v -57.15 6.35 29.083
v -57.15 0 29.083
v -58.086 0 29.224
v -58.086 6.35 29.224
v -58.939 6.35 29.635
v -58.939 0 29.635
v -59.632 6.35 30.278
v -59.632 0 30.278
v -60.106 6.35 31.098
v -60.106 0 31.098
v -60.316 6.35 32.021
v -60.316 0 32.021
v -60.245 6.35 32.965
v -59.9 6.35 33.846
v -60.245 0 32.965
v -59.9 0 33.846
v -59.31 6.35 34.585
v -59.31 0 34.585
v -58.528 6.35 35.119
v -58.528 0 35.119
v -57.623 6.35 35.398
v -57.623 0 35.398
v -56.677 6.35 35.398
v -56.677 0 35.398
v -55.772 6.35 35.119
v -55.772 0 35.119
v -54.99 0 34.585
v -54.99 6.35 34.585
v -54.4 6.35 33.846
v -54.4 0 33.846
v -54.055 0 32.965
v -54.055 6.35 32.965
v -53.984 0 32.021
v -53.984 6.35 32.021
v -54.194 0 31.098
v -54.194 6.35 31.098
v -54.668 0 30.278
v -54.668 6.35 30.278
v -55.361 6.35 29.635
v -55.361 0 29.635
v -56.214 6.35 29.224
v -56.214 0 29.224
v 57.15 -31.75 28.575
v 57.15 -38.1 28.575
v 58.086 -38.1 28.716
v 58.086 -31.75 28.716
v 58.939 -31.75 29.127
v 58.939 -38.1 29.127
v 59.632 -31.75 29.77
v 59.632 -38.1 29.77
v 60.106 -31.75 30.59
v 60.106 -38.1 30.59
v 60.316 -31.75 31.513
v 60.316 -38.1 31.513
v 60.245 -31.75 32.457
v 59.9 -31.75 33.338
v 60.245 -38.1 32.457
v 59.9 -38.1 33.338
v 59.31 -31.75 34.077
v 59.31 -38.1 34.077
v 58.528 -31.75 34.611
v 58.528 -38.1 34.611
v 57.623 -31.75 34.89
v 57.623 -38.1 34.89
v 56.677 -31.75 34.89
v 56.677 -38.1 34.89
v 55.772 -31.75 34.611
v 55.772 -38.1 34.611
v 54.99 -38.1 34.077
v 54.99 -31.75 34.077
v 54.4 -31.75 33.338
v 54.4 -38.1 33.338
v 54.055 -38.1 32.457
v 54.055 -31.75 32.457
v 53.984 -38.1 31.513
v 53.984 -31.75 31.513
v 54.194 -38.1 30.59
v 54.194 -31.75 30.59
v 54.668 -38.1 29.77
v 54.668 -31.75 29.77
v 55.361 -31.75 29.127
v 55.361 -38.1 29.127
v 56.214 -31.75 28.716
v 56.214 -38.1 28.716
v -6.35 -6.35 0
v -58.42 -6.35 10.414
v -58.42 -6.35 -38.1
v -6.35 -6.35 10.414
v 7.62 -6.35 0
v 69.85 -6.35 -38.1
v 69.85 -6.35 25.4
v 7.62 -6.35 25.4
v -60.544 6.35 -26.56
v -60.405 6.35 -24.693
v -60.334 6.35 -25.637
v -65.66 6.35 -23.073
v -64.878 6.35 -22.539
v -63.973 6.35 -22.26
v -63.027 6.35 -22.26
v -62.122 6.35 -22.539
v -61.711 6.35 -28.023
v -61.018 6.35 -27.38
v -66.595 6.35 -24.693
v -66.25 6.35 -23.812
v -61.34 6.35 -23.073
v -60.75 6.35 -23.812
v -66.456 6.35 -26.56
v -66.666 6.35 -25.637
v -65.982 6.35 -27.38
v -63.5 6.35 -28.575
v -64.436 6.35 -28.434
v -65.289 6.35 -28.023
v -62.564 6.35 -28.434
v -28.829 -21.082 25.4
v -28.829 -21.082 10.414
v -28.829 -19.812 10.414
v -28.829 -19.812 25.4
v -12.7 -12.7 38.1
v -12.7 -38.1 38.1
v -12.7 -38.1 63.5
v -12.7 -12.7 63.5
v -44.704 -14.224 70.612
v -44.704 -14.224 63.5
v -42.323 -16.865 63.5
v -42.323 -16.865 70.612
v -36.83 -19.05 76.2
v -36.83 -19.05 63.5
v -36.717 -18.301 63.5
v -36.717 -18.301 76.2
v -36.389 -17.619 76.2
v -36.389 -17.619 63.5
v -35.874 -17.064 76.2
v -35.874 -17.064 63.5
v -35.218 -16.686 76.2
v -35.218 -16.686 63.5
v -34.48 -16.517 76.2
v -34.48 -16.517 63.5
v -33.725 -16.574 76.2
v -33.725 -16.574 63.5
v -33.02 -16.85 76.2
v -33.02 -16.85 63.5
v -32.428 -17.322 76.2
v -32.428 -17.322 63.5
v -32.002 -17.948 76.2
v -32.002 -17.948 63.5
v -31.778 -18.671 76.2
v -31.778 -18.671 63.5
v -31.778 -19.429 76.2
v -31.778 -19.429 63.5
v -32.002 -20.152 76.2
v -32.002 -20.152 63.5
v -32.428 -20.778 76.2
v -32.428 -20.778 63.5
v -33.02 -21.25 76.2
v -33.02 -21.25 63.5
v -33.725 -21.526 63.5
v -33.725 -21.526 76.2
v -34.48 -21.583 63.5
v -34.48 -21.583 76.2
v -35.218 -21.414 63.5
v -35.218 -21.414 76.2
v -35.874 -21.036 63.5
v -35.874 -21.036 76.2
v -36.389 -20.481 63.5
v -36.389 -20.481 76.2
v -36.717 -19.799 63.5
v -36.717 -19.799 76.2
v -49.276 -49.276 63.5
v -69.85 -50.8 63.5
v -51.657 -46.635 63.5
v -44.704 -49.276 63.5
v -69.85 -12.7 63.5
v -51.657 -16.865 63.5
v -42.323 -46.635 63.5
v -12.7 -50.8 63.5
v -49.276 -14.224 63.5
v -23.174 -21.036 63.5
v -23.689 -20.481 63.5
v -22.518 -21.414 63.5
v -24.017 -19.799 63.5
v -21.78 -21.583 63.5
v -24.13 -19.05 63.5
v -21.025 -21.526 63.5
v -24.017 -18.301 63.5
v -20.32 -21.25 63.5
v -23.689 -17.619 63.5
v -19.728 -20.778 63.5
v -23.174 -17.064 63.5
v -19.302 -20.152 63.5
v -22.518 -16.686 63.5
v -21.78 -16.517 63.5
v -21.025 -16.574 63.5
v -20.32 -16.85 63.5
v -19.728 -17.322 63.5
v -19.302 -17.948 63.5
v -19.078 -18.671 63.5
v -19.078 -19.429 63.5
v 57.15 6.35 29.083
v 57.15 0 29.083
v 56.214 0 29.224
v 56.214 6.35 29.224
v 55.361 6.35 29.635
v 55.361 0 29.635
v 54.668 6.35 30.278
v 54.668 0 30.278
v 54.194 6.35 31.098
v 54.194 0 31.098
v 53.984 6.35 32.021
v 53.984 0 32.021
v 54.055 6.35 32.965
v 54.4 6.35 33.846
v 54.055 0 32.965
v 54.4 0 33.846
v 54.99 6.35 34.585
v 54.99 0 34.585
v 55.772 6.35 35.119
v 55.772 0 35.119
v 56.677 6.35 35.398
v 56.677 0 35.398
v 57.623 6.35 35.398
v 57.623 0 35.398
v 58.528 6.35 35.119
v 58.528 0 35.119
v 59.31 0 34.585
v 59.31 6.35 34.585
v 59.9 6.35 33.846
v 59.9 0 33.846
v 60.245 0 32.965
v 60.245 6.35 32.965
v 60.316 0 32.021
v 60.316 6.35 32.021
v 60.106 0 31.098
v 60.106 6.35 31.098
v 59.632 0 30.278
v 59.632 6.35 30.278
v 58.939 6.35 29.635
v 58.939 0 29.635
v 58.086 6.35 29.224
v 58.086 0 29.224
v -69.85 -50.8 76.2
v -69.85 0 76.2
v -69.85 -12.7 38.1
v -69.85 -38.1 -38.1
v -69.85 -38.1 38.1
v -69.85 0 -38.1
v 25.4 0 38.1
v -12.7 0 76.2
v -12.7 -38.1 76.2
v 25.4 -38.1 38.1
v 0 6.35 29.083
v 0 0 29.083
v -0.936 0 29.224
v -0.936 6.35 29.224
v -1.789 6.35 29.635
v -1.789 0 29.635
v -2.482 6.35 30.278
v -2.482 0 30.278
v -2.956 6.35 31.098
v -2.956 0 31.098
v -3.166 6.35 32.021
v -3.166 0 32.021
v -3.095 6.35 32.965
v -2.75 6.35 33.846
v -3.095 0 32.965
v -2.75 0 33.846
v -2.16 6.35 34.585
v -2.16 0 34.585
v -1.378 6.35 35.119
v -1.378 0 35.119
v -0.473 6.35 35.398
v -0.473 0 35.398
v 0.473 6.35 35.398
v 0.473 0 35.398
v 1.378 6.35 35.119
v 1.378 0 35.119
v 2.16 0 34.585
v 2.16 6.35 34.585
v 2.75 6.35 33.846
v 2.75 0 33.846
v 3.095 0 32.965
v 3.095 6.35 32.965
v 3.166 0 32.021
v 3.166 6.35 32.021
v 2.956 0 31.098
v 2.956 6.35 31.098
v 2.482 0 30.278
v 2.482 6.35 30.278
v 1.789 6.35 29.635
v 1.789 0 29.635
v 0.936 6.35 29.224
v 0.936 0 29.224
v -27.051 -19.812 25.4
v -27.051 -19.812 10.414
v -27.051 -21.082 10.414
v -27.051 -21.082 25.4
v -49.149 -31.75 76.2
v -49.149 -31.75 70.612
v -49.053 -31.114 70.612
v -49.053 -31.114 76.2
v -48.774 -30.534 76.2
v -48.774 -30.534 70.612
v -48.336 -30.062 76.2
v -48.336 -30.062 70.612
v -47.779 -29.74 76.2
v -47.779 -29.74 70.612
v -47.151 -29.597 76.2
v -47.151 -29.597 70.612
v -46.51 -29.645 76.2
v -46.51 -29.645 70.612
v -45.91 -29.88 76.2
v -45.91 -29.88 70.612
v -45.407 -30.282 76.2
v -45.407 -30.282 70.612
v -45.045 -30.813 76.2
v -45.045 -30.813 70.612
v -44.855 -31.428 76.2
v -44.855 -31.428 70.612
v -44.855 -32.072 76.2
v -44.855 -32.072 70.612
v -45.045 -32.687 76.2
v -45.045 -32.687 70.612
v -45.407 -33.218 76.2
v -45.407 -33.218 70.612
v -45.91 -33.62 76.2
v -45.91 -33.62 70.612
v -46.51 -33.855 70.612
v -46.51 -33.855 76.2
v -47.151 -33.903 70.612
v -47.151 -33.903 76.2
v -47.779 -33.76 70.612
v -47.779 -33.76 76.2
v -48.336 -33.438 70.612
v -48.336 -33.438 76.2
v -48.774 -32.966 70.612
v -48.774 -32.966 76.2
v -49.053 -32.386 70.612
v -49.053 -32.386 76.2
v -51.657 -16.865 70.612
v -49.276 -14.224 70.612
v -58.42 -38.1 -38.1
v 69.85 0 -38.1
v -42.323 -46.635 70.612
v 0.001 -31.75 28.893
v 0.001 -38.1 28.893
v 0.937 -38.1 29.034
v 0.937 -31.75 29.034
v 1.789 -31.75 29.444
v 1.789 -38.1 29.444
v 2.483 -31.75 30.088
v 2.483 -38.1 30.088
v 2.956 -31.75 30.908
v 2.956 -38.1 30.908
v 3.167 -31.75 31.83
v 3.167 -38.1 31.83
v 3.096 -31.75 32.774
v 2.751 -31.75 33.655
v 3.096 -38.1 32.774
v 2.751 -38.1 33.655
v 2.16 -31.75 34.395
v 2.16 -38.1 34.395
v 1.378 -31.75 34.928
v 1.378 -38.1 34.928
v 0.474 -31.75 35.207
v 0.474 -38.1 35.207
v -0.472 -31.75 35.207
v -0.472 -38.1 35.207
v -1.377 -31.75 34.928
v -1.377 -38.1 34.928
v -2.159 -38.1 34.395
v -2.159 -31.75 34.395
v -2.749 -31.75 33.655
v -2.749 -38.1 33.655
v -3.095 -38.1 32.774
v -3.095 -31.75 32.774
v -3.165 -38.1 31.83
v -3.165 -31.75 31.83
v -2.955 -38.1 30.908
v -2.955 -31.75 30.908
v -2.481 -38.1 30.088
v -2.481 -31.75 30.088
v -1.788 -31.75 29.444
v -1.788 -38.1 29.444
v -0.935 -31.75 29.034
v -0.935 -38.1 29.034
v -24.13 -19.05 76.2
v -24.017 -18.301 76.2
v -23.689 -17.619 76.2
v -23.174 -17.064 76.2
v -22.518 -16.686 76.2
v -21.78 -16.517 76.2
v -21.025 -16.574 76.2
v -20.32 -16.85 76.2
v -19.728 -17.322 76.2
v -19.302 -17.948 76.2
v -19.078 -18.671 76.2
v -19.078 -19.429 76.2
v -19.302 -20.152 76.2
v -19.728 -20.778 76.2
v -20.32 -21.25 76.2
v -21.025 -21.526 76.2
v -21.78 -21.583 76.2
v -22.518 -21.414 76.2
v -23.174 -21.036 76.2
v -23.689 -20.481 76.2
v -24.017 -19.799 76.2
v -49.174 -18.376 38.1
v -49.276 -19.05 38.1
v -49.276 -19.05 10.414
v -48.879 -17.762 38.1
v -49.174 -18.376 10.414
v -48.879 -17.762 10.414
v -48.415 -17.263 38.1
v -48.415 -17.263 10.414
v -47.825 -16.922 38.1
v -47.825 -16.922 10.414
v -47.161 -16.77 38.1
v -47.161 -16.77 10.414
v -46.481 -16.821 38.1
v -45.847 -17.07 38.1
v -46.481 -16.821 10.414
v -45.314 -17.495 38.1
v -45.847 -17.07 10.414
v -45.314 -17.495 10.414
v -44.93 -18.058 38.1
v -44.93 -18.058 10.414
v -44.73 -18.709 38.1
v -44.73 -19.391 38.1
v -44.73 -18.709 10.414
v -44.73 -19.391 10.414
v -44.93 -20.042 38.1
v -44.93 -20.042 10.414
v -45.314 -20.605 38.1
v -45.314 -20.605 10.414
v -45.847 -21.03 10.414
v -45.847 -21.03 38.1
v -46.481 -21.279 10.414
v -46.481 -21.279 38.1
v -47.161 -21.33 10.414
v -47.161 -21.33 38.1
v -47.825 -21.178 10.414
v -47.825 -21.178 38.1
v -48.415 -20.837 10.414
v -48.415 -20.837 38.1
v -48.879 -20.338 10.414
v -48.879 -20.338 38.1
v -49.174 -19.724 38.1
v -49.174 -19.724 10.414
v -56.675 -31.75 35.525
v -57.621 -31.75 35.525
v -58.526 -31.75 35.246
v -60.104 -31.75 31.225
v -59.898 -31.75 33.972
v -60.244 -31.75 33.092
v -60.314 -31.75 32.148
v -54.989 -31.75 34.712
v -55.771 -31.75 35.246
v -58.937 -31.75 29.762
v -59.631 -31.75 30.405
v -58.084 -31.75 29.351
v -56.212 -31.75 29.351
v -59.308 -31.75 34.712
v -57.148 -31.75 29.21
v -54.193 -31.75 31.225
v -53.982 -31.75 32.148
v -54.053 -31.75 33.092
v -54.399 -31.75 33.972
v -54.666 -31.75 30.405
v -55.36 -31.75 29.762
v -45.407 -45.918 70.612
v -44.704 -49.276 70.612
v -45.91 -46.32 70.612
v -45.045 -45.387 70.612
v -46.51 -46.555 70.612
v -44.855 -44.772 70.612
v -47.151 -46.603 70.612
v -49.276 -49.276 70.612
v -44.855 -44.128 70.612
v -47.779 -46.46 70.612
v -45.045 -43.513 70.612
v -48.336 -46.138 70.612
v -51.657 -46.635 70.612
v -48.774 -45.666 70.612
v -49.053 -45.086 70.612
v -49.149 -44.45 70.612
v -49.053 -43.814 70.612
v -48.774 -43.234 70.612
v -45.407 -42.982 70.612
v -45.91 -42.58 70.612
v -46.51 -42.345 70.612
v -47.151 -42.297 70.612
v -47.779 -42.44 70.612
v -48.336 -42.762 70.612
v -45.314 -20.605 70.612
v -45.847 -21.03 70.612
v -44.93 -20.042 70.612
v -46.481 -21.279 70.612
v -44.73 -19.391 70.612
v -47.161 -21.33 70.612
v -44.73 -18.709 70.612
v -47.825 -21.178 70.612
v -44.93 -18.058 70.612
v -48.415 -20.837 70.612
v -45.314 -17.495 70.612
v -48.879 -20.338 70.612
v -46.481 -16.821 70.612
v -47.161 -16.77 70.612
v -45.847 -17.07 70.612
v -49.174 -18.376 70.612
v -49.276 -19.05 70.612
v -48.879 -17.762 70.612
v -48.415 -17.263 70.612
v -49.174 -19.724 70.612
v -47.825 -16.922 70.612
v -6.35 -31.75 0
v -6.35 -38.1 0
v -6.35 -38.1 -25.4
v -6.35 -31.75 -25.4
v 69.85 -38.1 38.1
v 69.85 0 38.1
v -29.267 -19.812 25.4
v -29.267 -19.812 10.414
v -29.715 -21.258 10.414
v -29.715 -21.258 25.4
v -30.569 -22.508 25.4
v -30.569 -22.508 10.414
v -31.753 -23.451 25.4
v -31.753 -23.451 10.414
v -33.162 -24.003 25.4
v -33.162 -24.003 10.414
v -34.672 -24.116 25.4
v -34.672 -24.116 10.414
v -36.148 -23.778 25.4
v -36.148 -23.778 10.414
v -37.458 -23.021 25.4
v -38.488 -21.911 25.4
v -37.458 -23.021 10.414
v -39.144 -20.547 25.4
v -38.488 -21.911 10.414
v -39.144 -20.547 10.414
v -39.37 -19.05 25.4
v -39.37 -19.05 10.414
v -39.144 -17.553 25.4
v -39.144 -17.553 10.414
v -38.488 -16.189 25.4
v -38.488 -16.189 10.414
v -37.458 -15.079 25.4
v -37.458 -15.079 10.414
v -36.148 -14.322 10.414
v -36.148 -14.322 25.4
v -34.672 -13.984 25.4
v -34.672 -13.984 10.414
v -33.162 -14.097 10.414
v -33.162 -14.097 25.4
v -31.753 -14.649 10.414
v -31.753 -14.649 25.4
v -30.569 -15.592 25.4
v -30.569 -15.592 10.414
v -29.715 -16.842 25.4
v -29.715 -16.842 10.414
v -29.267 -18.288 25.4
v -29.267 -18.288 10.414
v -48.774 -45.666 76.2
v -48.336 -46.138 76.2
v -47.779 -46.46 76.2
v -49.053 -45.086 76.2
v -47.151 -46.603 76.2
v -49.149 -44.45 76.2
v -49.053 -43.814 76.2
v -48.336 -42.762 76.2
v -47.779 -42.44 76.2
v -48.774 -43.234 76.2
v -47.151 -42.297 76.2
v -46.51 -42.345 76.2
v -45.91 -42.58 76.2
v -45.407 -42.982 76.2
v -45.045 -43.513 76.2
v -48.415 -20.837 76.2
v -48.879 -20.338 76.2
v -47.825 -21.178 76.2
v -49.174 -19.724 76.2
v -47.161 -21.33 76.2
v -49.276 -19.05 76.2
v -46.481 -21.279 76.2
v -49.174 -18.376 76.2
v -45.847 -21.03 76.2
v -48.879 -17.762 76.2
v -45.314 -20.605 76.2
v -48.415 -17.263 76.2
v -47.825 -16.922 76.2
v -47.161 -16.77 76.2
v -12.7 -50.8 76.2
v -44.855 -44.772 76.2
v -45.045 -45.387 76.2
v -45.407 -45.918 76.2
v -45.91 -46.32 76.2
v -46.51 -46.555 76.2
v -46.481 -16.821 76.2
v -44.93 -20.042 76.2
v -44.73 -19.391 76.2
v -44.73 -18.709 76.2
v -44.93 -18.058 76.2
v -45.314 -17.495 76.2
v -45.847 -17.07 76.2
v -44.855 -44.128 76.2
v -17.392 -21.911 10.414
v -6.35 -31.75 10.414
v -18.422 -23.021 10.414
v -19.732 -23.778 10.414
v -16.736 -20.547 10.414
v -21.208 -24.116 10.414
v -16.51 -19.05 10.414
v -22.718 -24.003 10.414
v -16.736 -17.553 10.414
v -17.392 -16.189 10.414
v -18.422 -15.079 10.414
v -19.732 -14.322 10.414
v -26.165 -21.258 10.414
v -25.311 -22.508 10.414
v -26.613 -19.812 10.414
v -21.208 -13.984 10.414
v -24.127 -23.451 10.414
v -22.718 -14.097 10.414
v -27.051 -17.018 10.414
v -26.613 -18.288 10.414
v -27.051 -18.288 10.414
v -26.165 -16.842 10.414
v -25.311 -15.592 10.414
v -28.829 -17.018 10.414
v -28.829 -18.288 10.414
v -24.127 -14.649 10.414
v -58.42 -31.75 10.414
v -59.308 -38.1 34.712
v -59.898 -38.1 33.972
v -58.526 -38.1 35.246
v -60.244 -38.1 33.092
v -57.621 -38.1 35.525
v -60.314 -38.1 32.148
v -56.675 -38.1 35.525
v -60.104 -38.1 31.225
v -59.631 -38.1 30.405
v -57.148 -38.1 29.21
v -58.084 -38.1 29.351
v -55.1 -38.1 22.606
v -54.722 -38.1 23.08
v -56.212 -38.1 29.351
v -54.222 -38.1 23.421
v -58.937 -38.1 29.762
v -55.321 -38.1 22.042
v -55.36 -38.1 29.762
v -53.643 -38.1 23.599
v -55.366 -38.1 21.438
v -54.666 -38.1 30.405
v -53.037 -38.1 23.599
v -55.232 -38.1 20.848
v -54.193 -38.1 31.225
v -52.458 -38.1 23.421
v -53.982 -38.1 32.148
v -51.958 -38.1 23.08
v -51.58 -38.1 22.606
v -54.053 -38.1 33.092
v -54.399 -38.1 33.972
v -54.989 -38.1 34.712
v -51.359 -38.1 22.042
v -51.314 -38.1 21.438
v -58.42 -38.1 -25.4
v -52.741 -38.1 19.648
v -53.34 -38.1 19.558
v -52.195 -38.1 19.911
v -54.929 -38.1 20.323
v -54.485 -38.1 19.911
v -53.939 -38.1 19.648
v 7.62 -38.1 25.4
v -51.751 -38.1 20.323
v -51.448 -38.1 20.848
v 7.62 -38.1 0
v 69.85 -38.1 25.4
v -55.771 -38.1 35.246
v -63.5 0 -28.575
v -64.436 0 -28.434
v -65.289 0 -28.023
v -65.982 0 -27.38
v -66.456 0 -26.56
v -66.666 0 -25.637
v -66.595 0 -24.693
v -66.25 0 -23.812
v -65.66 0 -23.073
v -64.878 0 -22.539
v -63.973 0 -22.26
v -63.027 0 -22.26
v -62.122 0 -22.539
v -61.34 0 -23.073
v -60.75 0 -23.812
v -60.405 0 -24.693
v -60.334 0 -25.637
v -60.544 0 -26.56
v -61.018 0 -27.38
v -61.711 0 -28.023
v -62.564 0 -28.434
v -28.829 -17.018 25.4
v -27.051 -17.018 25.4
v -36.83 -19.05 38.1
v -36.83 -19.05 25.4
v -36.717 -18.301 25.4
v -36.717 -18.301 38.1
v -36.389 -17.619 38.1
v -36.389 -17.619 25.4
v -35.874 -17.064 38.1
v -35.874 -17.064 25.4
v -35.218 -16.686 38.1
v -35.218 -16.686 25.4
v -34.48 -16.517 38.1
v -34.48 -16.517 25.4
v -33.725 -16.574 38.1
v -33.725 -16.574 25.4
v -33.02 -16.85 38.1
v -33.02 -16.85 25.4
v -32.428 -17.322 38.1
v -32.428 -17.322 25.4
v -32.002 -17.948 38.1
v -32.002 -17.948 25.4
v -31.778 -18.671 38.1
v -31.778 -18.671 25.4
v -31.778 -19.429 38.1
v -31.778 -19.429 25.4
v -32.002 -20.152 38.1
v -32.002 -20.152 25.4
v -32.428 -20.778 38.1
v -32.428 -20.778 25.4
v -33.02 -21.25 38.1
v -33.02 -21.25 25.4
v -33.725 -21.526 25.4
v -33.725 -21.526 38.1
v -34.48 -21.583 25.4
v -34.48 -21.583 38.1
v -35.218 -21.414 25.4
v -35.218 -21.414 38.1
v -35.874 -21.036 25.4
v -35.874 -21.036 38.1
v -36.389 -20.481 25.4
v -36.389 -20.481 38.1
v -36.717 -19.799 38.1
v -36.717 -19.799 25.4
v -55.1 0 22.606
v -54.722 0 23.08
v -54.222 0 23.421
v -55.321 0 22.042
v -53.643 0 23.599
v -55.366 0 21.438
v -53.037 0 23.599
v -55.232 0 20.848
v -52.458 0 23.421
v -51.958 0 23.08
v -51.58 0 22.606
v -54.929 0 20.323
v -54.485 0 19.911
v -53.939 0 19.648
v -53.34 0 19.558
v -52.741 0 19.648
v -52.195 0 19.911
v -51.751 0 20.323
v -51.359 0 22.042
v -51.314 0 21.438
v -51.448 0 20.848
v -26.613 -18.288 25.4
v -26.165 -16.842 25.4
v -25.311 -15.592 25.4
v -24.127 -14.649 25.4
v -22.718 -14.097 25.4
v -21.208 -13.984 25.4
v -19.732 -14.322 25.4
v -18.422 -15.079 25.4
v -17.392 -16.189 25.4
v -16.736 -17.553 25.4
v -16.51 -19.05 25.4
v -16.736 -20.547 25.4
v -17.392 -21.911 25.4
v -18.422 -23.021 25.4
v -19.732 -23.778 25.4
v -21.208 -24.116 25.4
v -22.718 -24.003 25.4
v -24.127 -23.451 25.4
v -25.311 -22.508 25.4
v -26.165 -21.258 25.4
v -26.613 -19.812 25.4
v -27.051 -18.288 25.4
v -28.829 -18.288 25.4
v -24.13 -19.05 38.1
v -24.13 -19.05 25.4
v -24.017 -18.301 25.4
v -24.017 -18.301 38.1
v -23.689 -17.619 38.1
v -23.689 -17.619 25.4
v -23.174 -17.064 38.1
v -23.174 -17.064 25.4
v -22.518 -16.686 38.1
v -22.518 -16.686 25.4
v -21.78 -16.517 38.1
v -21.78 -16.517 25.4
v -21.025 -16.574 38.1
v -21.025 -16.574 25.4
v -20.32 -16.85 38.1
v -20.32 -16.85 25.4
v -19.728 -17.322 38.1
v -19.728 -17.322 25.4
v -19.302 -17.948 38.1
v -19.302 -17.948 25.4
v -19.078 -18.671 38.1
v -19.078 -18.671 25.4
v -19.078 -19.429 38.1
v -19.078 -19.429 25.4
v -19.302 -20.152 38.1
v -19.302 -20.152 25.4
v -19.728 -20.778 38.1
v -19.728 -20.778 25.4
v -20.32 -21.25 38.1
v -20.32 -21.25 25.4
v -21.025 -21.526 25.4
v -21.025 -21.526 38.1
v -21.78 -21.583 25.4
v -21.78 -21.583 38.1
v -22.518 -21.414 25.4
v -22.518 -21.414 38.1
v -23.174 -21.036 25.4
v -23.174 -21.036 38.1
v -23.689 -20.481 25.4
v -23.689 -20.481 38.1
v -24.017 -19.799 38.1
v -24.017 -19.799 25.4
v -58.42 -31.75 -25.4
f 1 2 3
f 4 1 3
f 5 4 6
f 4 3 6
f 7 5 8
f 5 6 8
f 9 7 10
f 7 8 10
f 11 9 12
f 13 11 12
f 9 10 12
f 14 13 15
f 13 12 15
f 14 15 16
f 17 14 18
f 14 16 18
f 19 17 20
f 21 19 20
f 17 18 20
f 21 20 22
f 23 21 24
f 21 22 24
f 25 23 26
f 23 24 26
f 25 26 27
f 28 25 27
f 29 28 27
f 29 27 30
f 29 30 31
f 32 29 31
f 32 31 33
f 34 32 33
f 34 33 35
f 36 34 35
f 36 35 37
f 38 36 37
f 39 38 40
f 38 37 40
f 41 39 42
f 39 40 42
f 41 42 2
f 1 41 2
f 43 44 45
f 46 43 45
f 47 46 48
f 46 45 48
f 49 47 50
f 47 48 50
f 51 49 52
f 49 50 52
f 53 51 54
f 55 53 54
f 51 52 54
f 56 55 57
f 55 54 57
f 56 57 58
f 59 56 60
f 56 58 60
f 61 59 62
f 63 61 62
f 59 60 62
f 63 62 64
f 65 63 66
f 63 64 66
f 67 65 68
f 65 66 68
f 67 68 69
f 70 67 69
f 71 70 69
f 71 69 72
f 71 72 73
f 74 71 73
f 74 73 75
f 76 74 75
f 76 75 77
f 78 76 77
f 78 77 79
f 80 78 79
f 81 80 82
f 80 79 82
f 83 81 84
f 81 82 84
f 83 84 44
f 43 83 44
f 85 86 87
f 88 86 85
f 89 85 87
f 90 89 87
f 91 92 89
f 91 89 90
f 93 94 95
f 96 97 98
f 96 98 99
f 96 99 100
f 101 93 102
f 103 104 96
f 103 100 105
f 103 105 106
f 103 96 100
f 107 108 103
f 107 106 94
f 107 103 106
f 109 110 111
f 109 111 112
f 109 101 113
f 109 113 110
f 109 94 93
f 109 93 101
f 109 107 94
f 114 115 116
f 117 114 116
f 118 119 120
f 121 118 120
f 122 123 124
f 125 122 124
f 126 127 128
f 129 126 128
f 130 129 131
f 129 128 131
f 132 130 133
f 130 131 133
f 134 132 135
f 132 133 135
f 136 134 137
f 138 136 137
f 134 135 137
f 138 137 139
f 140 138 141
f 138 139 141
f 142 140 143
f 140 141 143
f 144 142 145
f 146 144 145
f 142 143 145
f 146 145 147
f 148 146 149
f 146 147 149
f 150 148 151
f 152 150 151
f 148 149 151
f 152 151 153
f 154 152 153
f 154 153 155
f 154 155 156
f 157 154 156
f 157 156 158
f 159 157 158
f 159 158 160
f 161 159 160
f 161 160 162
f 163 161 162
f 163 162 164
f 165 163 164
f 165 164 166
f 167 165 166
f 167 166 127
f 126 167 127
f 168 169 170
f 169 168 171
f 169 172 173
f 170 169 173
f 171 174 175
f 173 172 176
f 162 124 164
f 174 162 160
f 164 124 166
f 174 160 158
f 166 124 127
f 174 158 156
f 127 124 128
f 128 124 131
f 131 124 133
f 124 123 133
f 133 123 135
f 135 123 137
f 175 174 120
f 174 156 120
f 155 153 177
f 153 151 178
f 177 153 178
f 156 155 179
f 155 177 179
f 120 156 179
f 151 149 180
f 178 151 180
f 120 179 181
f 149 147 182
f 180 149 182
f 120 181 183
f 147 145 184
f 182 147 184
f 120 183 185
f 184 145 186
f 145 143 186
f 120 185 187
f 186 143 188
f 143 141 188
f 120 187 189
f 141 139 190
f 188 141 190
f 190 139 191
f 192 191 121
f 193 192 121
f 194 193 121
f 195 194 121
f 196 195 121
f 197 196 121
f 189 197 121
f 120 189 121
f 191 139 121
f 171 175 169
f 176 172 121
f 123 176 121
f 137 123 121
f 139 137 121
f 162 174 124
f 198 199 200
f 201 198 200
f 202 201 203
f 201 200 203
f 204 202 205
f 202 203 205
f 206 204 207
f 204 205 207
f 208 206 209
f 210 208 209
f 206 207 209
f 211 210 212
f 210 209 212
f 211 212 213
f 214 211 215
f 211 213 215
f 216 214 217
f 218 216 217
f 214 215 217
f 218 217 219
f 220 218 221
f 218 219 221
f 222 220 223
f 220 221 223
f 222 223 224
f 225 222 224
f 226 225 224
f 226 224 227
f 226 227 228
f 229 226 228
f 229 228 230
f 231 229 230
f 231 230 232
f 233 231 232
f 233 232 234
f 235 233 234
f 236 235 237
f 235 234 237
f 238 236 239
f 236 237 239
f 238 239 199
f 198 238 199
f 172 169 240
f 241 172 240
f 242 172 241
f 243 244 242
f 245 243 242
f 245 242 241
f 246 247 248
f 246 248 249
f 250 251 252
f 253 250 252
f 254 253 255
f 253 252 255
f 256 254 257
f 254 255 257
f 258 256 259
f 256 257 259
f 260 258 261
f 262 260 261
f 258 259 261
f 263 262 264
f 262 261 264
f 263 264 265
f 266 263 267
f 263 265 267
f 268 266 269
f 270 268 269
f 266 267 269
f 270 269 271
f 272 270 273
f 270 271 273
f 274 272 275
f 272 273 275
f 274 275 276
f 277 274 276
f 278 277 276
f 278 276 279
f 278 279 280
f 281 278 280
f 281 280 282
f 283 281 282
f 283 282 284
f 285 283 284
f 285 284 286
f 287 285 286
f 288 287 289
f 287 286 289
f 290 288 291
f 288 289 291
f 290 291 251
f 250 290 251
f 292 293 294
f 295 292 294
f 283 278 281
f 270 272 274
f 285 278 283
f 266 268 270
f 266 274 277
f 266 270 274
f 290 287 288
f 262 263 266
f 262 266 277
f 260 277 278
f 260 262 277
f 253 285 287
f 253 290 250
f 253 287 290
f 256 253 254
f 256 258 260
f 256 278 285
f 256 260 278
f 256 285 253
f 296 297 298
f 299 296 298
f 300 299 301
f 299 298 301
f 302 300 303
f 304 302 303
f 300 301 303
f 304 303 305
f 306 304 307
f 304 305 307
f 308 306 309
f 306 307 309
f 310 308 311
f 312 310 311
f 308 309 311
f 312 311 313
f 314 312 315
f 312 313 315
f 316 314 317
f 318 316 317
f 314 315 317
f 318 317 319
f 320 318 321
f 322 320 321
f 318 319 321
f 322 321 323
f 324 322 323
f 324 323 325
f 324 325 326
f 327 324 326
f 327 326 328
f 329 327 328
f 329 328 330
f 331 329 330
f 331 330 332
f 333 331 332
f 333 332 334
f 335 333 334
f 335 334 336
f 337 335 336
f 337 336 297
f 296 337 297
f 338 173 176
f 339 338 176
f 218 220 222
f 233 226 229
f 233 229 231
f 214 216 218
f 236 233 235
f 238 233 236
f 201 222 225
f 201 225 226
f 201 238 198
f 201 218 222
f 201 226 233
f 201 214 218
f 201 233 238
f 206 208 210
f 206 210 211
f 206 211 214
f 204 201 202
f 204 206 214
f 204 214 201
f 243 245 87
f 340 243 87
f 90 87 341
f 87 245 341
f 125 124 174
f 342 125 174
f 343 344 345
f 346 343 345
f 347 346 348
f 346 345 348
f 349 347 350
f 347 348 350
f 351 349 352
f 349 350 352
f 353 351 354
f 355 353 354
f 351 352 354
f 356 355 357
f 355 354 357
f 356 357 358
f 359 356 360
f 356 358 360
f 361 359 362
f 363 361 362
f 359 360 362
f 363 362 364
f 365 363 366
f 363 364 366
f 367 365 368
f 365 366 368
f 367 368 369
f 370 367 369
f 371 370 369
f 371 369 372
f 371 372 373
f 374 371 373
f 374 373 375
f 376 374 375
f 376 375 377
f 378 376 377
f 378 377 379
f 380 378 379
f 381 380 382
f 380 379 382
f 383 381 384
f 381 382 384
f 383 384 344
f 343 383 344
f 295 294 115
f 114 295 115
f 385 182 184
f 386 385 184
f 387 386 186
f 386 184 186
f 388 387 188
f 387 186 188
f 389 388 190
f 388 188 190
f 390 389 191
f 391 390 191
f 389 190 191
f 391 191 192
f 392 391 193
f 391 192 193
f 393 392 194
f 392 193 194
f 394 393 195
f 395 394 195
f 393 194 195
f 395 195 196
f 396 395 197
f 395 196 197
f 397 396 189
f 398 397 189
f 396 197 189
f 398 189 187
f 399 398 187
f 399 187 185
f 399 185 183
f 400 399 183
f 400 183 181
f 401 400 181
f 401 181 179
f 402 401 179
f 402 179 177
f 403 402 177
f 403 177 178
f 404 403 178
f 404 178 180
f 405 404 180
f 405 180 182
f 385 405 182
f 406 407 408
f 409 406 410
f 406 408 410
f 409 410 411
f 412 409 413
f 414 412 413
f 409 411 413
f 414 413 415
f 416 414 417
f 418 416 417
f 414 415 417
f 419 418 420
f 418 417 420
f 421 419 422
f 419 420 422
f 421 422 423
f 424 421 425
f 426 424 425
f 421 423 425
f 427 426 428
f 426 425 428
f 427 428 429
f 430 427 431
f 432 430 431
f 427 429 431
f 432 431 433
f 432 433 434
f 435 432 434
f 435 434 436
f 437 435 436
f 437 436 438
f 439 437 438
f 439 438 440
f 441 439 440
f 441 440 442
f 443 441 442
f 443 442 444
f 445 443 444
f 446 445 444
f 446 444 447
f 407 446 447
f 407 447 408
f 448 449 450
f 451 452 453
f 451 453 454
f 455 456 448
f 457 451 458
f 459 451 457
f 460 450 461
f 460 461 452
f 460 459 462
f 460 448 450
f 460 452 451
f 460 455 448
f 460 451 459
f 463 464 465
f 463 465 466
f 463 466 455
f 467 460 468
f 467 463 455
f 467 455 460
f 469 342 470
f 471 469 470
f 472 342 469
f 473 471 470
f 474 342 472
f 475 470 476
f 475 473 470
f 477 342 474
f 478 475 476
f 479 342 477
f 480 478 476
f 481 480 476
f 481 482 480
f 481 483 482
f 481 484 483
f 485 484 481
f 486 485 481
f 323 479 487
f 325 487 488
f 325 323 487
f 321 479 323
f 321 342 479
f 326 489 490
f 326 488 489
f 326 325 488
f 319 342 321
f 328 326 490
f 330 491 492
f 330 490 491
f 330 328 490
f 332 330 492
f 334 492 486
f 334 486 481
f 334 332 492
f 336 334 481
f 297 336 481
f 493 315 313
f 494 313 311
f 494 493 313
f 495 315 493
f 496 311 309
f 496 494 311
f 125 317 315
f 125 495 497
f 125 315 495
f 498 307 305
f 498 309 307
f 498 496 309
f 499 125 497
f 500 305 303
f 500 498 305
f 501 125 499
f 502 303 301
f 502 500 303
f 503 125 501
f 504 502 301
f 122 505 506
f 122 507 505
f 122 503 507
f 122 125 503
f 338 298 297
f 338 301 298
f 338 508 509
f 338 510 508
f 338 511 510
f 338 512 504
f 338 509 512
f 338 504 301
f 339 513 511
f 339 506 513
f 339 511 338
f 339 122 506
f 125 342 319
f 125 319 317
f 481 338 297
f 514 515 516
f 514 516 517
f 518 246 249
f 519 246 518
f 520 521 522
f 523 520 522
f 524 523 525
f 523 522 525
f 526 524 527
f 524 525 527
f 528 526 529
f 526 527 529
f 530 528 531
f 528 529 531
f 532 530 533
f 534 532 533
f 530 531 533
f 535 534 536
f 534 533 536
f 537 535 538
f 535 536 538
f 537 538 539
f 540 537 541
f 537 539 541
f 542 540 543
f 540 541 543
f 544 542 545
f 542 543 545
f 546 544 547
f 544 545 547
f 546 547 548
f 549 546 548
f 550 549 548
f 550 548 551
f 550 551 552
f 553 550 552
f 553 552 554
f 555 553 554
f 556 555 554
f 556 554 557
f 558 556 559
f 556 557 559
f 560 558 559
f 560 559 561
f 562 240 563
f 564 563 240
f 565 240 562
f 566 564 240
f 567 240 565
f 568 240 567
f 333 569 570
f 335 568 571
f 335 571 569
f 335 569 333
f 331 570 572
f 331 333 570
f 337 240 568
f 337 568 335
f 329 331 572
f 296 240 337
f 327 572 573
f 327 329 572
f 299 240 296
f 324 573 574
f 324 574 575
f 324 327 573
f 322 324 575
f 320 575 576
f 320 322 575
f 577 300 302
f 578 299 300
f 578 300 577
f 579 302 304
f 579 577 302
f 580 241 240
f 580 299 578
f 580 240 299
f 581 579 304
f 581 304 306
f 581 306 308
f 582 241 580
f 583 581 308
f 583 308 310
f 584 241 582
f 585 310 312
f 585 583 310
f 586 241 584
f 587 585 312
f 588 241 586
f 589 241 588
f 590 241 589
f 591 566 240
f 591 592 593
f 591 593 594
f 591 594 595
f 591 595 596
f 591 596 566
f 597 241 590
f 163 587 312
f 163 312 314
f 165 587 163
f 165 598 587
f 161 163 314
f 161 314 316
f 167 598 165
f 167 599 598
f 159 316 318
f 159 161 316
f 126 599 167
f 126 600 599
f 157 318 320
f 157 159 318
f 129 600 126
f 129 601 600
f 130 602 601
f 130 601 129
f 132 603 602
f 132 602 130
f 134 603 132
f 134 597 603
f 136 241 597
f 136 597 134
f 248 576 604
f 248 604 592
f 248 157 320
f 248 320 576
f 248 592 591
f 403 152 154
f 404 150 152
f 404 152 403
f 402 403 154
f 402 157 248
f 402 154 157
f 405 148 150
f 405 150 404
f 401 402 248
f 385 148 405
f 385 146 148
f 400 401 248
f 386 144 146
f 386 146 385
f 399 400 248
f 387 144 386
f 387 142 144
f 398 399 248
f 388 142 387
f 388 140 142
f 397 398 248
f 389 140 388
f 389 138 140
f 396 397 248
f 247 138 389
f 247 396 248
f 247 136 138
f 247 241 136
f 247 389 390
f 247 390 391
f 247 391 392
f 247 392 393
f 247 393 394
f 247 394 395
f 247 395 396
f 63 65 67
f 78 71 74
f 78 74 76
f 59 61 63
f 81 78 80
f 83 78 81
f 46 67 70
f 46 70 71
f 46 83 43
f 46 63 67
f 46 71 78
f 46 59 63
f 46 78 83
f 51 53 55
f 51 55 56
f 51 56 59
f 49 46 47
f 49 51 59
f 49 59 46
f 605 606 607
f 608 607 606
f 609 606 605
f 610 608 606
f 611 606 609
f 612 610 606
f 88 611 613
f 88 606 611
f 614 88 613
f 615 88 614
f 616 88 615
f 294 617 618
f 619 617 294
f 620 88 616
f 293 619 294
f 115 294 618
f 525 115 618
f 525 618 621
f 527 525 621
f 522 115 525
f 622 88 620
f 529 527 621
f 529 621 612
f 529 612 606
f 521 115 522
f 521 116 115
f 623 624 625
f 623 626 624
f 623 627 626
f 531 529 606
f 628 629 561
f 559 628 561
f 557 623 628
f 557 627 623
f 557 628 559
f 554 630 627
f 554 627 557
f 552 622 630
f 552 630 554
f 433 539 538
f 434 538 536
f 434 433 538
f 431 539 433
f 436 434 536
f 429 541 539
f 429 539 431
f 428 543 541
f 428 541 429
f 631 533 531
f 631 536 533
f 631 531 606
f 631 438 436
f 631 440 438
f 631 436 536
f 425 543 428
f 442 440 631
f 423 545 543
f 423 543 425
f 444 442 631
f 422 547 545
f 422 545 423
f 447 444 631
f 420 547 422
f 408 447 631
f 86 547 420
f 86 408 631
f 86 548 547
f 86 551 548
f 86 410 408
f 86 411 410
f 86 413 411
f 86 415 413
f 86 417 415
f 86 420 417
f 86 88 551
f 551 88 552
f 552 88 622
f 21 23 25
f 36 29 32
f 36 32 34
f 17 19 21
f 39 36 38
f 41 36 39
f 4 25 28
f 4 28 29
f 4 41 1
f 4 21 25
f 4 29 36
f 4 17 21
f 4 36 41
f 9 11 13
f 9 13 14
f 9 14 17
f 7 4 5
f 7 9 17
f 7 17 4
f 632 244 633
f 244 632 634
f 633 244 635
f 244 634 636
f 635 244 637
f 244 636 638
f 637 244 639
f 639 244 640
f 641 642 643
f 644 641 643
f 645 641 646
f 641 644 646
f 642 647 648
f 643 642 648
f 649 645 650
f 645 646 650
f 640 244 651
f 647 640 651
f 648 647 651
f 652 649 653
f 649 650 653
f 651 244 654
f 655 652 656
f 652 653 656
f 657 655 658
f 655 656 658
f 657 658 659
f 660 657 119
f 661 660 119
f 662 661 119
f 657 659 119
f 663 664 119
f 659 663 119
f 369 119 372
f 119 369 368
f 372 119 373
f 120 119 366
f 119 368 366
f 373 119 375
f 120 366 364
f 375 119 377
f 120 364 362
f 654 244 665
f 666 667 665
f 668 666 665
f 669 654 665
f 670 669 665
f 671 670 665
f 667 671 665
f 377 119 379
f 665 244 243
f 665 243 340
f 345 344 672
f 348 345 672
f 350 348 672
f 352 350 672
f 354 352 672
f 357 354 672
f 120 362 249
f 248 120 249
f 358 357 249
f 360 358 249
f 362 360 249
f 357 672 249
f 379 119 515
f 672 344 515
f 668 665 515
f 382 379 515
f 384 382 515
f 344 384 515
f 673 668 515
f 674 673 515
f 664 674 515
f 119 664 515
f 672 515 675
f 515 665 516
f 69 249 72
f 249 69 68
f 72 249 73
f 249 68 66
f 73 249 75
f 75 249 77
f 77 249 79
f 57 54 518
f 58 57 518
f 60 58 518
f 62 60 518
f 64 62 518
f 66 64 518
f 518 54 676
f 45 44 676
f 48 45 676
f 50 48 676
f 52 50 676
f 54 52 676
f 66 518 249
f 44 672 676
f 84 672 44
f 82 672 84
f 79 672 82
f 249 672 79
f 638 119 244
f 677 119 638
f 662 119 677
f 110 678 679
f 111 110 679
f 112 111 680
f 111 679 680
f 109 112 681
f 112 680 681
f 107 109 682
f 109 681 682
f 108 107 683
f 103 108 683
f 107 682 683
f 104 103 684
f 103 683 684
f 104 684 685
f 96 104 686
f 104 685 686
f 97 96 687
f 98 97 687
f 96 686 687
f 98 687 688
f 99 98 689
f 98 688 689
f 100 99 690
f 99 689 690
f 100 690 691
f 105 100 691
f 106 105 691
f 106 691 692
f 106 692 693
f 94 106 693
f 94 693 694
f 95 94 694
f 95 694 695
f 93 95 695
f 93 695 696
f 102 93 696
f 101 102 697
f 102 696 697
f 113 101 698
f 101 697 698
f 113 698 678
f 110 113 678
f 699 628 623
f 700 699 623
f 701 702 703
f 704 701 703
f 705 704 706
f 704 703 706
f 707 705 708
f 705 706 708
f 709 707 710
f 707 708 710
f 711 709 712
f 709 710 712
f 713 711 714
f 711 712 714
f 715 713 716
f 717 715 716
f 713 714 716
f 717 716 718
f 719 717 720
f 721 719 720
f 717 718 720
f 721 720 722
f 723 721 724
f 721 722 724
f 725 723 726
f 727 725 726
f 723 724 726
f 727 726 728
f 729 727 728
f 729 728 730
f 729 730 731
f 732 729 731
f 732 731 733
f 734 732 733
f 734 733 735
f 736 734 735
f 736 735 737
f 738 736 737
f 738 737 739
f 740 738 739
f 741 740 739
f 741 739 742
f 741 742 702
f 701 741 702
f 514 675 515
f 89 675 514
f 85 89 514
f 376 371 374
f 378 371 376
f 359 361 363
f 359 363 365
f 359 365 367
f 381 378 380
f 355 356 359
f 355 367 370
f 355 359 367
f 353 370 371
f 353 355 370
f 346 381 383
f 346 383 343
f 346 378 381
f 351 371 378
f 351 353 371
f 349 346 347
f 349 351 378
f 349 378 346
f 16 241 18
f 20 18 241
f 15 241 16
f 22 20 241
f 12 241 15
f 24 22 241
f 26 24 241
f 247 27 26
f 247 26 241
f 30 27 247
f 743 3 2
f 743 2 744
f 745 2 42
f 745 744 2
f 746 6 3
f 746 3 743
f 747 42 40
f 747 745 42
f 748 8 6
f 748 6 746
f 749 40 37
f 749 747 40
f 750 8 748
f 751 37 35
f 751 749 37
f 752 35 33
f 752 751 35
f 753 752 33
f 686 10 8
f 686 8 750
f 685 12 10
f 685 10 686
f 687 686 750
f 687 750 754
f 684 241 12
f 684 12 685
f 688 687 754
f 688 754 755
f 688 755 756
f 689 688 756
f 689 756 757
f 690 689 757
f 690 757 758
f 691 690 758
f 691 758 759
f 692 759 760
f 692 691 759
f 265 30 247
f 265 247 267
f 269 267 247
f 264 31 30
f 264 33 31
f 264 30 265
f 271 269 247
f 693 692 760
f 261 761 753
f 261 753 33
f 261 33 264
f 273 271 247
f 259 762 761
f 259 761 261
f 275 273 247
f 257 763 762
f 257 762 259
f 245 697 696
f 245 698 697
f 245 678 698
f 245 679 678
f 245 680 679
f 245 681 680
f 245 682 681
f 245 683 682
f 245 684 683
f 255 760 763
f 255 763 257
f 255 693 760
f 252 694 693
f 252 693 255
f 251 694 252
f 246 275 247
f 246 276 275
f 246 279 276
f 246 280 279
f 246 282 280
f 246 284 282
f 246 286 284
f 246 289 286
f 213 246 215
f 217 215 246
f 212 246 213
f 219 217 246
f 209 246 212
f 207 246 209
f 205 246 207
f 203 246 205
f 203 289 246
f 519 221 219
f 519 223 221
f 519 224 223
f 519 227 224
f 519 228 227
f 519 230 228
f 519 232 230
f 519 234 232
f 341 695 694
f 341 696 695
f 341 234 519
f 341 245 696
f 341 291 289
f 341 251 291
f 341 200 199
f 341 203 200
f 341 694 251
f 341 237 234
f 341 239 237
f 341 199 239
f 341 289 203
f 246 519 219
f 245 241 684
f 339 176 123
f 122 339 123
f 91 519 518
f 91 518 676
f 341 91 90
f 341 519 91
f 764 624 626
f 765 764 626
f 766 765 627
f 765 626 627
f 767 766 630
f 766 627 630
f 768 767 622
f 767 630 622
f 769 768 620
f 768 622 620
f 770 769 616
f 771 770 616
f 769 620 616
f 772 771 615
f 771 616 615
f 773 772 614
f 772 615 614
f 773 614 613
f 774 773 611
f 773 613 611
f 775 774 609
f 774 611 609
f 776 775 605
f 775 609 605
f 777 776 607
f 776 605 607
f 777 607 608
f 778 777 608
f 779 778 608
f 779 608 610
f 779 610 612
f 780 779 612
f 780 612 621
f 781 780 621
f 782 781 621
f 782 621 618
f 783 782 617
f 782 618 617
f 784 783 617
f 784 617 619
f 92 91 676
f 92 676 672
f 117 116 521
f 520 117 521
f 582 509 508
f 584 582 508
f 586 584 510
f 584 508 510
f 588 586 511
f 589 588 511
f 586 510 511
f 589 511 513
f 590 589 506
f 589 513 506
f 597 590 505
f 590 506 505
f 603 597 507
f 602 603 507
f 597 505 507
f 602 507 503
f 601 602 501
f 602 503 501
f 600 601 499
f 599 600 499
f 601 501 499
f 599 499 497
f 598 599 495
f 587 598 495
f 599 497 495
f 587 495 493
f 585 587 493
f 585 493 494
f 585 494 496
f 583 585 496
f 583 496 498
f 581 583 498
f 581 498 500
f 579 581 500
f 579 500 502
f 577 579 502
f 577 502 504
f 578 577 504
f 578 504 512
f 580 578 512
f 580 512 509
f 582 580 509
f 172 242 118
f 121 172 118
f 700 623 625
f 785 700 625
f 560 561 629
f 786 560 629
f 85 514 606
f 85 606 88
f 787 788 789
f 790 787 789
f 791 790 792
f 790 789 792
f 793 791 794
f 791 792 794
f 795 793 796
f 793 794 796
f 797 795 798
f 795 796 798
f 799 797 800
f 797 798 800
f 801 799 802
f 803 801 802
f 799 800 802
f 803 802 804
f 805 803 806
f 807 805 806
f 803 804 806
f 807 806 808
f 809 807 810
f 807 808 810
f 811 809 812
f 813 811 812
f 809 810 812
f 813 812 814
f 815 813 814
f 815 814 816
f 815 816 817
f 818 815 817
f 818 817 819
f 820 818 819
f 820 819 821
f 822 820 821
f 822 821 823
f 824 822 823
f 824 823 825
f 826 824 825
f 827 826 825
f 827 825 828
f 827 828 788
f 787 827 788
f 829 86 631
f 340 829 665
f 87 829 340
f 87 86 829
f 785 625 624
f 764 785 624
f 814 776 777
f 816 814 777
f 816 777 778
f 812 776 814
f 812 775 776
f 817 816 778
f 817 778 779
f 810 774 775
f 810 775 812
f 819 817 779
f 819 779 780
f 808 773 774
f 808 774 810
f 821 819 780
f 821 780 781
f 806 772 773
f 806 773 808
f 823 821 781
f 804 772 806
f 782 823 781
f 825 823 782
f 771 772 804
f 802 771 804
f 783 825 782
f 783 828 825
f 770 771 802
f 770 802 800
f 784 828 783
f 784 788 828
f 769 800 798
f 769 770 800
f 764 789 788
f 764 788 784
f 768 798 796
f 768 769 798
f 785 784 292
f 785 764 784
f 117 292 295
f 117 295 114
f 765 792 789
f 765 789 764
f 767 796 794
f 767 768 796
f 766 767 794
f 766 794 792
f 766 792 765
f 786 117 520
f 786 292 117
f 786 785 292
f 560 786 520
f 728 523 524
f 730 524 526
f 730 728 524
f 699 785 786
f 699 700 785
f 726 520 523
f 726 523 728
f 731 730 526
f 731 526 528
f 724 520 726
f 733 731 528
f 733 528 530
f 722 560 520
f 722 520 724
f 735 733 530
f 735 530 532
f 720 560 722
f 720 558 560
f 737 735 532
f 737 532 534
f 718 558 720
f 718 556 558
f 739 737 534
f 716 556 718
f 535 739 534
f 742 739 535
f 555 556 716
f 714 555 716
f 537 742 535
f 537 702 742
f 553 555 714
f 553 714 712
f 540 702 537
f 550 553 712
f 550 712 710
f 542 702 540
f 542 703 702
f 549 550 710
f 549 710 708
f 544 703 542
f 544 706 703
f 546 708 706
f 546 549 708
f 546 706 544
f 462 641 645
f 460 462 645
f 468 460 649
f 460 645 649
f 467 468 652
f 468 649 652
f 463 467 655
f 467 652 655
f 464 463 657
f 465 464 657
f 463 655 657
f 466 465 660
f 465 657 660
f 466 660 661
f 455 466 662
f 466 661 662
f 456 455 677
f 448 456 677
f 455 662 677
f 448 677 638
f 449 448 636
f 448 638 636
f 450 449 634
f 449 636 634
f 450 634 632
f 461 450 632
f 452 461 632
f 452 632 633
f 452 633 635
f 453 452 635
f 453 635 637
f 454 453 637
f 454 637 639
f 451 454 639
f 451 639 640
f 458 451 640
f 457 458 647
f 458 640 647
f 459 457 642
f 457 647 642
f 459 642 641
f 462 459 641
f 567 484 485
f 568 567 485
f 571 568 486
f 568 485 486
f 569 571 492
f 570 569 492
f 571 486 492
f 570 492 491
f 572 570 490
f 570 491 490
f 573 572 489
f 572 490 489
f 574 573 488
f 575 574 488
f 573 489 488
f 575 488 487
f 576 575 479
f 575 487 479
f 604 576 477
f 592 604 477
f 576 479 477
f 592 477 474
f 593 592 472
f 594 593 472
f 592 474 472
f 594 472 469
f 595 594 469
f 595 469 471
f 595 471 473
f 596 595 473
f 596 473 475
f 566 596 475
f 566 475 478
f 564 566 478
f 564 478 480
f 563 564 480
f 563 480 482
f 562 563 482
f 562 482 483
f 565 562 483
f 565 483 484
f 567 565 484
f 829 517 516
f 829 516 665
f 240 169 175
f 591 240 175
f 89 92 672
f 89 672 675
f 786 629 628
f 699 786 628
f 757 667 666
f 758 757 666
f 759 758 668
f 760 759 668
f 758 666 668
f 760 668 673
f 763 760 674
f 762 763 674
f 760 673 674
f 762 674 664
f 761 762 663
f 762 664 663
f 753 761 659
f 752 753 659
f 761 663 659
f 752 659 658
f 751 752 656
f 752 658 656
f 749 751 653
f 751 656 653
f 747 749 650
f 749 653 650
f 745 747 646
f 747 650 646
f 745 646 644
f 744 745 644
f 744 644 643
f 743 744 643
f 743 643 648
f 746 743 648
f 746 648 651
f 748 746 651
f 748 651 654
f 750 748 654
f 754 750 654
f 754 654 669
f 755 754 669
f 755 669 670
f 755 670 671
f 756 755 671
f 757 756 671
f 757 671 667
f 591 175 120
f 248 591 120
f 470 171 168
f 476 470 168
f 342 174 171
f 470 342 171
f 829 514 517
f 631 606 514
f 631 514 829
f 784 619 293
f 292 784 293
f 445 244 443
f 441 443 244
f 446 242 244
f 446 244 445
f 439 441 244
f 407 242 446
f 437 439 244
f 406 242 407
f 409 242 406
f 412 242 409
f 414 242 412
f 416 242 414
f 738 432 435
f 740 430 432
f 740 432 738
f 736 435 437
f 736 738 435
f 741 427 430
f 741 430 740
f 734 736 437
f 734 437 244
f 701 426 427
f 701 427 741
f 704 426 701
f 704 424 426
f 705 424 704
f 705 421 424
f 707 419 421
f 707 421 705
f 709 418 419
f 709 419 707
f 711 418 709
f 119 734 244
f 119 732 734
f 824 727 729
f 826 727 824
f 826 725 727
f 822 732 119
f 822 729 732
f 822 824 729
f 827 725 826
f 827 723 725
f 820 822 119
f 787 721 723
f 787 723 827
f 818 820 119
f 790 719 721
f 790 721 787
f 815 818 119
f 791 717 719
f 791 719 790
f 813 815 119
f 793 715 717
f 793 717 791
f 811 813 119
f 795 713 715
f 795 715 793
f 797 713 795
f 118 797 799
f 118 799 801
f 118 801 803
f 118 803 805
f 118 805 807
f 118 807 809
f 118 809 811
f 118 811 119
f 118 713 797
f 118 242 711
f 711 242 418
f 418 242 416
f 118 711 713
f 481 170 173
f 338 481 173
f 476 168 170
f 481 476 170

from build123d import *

# Parameters (mm, degrees)
SKETCH1_W               = 139.7
SKETCH1_H               = 76.2
BOSS_EXTRUDE1_DEPTH     = 38.1
CUT_EXTRUDE1_DEPTH      = 89.217019333
CUT_EXTRUDE1_DEPTH_BACK = 31.75
SKETCH3_R               = 2.032
CUT_EXTRUDE2_DEPTH      = 89.217019333
SKETCH4_W               = 52.07
SKETCH4_H               = 25.4
CUT_EXTRUDE3_DEPTH      = 10.414
SKETCH7_W               = 57.15
SKETCH7_H               = 12.7
BOSS_EXTRUDE2_DEPTH     = 25.4
SKETCH8_W               = 57.15
SKETCH8_H               = 50.8
BOSS_EXTRUDE3_DEPTH     = 12.7
SKETCH5_R               = 2.286
SKETCH5_R_2             = 2.54
CUT_EXTRUDE4_DEPTH      = 109.570070904
CUT_EXTRUDE5_DEPTH      = 14.986
CUT_EXTRUDE6_DEPTH      = 7.112
SKETCH10_R              = 2.159
CUT_EXTRUDE7_DEPTH      = 139.84509874
SKETCH11_W              = 52.07
SKETCH11_H              = 6.35
BOSS_EXTRUDE4_DEPTH     = 25.4
BOSS_EXTRUDE5_DEPTH     = 38.1
SKETCH15_R              = 3.175
CUT_EXTRUDE8_DEPTH      = 6.35
SKETCH16_R              = 3.175
BOSS_EXTRUDE6_DEPTH     = 6.35


with BuildPart() as part:
    # Sketch1 → Boss-Extrude1 (new body)
    with BuildSketch(Plane(origin=(0, 0, 0), x_dir=(1, 0, 0), z_dir=(0, 1, 0))):
        Rectangle(SKETCH1_W, SKETCH1_H)
    extrude(amount=-BOSS_EXTRUDE1_DEPTH)

    # Sketch2 → Cut-Extrude1 (cut, two sides: drawn at the far end of the back side and taken through both)
    with BuildSketch(Plane.XZ.offset(38.1).offset(-CUT_EXTRUDE1_DEPTH_BACK)):
        Polygon((386.759367729, 25.4), (69.85, 25.4), (7.62, 25.4), (7.62, 0), (-58.42, 0), (-58.42, -38.1), (-58.42, -355.009367729), (353.331408797, -836.86719611), (798.510776526, -456.457828381), align=None)
    extrude(amount=CUT_EXTRUDE1_DEPTH + CUT_EXTRUDE1_DEPTH_BACK, mode=Mode.SUBTRACT)

    # Sketch3 → Cut-Extrude2 (cut, through all)
    with BuildSketch(Plane.XZ.offset(38.1)):
        with Locations(Location((-53.34, 21.59, 0), (0, 0, 270))):
            Circle(SKETCH3_R)
    extrude(amount=-CUT_EXTRUDE2_DEPTH, mode=Mode.SUBTRACT)

    # Sketch4 → Cut-Extrude3 (cut)
    with BuildSketch(Plane(origin=(0, 0, 0), x_dir=(-1, 0, 0), z_dir=(0, 0, -1))):
        with Locations((32.385, -19.05)):
            Rectangle(SKETCH4_W, SKETCH4_H)
    extrude(amount=-CUT_EXTRUDE3_DEPTH, mode=Mode.SUBTRACT)

    # Sketch7 → Boss-Extrude2 (add)
    with BuildSketch(Plane.XY.offset(38.1)):
        with Locations((-41.275, -6.35)):
            Rectangle(SKETCH7_W, SKETCH7_H)
    extrude(amount=BOSS_EXTRUDE2_DEPTH)

    # Sketch8 → Boss-Extrude3 (add)
    with BuildSketch(Plane.XY.offset(63.5)):
        with Locations((-41.275, -25.4)):
            Rectangle(SKETCH8_W, SKETCH8_H)
    extrude(amount=BOSS_EXTRUDE3_DEPTH)

    # Sketch5 → Cut-Extrude4 (cut, through all)
    with BuildSketch(Plane(origin=(0, 0, 10.414), x_dir=(-1, 0, 0), z_dir=(0, 0, -1))):
        with Locations((46.99, -19.05)):
            Circle(SKETCH5_R)
        with Locations((34.29, -19.05)):
            Circle(SKETCH5_R_2)
        with Locations((21.59, -19.05)):
            Circle(SKETCH5_R_2)
    extrude(amount=-CUT_EXTRUDE4_DEPTH, mode=Mode.SUBTRACT)

    # Sketch6 → Cut-Extrude5 (cut)
    with BuildSketch(Plane(origin=(0, 0, 10.414), x_dir=(-1, 0, 0), z_dir=(0, 0, -1))):
        with BuildLine():
            Line((27.051, -18.288), (26.612524863, -18.288))
            ThreePointArc((26.612524863, -18.288), (16.51, -19.05), (26.612524863, -19.812))
            Line((26.612524863, -19.812), (27.051, -19.812))
            Line((27.051, -19.812), (27.051, -21.082))
            Line((27.051, -21.082), (28.829, -21.082))
            Line((28.829, -21.082), (28.829, -19.812))
            Line((28.829, -19.812), (29.267475137, -19.812))
            ThreePointArc((29.267475137, -19.812), (39.37, -19.05), (29.267475137, -18.288))
            Line((29.267475137, -18.288), (28.829, -18.288))
            Line((28.829, -18.288), (28.829, -17.018))
            Line((28.829, -17.018), (27.051, -17.018))
            Line((27.051, -17.018), (27.051, -18.288))
        make_face()
    extrude(amount=-CUT_EXTRUDE5_DEPTH, mode=Mode.SUBTRACT)

    # Sketch9 → Cut-Extrude6 (cut)
    with BuildSketch(Plane(origin=(0, 0, 63.5), x_dir=(-1, 0, 0), z_dir=(0, 0, -1))):
        Polygon((42.323188216, -16.865376771), (42.323188216, -46.634623229), (44.704, -49.276), (49.276, -49.276), (51.656811784, -46.634623229), (51.656811784, -16.865376771), (49.276, -14.224), (44.704, -14.224), align=None)
    extrude(amount=-CUT_EXTRUDE6_DEPTH, mode=Mode.SUBTRACT)

    # Sketch10 → Cut-Extrude7 (cut, through all)
    with BuildSketch(Plane(origin=(0, 0, 70.612), x_dir=(-1, 0, 0), z_dir=(0, 0, -1))):
        with Locations((46.99, -19.05)):
            Circle(SKETCH10_R)
        with Locations((46.99, -31.75)):
            Circle(SKETCH10_R)
        with Locations((46.99, -44.45)):
            Circle(SKETCH10_R)
    extrude(amount=-CUT_EXTRUDE7_DEPTH, mode=Mode.SUBTRACT)

    # Sketch11 → Boss-Extrude4 (add)
    with BuildSketch(Plane(origin=(0, 0, 0), x_dir=(-1, 0, 0), z_dir=(0, 0, -1))):
        with Locations((32.385, -34.925)):
            Rectangle(SKETCH11_W, SKETCH11_H)
    extrude(amount=BOSS_EXTRUDE4_DEPTH)

    # Sketch14 → Boss-Extrude5 (add)
    with BuildSketch(Plane(origin=(0, 0, 0), x_dir=(1, 0, 0), z_dir=(0, 1, 0))):
        Polygon((-12.7, -76.2), (25.4, -38.1), (-12.7, -38.1), align=None)
    extrude(amount=-BOSS_EXTRUDE5_DEPTH)

    # Sketch15 → Cut-Extrude8 (cut)
    with BuildSketch(Plane.XZ.offset(38.1)):
        with Locations(Location((57.15, 31.75, 0), (0, 0, 270))):
            Circle(SKETCH15_R)
        with Locations(Location((0.000881951, 32.0675, 0), (0, 0, 270))):
            Circle(SKETCH15_R)
        with Locations(Location((-57.148236098, 32.385, 0), (0, 0, 270))):
            Circle(SKETCH15_R)
    extrude(amount=-CUT_EXTRUDE8_DEPTH, mode=Mode.SUBTRACT)

    # Sketch16 → Boss-Extrude6 (add)
    with BuildSketch(Plane(origin=(0, 0, 0), x_dir=(1, 0, 0), z_dir=(0, 1, 0))):
        with Locations(Location((57.15, -32.258, 0), (0, 0, 90))):
            Circle(SKETCH16_R)
        with Locations(Location((0, -32.258, 0), (0, 0, 90))):
            Circle(SKETCH16_R)
        with Locations(Location((-57.15, -32.258, 0), (0, 0, 90))):
            Circle(SKETCH16_R)
        with Locations(Location((-63.5, 25.4, 0), (0, 0, 90))):
            Circle(SKETCH16_R)
    extrude(amount=BOSS_EXTRUDE6_DEPTH)


solid = part.part
